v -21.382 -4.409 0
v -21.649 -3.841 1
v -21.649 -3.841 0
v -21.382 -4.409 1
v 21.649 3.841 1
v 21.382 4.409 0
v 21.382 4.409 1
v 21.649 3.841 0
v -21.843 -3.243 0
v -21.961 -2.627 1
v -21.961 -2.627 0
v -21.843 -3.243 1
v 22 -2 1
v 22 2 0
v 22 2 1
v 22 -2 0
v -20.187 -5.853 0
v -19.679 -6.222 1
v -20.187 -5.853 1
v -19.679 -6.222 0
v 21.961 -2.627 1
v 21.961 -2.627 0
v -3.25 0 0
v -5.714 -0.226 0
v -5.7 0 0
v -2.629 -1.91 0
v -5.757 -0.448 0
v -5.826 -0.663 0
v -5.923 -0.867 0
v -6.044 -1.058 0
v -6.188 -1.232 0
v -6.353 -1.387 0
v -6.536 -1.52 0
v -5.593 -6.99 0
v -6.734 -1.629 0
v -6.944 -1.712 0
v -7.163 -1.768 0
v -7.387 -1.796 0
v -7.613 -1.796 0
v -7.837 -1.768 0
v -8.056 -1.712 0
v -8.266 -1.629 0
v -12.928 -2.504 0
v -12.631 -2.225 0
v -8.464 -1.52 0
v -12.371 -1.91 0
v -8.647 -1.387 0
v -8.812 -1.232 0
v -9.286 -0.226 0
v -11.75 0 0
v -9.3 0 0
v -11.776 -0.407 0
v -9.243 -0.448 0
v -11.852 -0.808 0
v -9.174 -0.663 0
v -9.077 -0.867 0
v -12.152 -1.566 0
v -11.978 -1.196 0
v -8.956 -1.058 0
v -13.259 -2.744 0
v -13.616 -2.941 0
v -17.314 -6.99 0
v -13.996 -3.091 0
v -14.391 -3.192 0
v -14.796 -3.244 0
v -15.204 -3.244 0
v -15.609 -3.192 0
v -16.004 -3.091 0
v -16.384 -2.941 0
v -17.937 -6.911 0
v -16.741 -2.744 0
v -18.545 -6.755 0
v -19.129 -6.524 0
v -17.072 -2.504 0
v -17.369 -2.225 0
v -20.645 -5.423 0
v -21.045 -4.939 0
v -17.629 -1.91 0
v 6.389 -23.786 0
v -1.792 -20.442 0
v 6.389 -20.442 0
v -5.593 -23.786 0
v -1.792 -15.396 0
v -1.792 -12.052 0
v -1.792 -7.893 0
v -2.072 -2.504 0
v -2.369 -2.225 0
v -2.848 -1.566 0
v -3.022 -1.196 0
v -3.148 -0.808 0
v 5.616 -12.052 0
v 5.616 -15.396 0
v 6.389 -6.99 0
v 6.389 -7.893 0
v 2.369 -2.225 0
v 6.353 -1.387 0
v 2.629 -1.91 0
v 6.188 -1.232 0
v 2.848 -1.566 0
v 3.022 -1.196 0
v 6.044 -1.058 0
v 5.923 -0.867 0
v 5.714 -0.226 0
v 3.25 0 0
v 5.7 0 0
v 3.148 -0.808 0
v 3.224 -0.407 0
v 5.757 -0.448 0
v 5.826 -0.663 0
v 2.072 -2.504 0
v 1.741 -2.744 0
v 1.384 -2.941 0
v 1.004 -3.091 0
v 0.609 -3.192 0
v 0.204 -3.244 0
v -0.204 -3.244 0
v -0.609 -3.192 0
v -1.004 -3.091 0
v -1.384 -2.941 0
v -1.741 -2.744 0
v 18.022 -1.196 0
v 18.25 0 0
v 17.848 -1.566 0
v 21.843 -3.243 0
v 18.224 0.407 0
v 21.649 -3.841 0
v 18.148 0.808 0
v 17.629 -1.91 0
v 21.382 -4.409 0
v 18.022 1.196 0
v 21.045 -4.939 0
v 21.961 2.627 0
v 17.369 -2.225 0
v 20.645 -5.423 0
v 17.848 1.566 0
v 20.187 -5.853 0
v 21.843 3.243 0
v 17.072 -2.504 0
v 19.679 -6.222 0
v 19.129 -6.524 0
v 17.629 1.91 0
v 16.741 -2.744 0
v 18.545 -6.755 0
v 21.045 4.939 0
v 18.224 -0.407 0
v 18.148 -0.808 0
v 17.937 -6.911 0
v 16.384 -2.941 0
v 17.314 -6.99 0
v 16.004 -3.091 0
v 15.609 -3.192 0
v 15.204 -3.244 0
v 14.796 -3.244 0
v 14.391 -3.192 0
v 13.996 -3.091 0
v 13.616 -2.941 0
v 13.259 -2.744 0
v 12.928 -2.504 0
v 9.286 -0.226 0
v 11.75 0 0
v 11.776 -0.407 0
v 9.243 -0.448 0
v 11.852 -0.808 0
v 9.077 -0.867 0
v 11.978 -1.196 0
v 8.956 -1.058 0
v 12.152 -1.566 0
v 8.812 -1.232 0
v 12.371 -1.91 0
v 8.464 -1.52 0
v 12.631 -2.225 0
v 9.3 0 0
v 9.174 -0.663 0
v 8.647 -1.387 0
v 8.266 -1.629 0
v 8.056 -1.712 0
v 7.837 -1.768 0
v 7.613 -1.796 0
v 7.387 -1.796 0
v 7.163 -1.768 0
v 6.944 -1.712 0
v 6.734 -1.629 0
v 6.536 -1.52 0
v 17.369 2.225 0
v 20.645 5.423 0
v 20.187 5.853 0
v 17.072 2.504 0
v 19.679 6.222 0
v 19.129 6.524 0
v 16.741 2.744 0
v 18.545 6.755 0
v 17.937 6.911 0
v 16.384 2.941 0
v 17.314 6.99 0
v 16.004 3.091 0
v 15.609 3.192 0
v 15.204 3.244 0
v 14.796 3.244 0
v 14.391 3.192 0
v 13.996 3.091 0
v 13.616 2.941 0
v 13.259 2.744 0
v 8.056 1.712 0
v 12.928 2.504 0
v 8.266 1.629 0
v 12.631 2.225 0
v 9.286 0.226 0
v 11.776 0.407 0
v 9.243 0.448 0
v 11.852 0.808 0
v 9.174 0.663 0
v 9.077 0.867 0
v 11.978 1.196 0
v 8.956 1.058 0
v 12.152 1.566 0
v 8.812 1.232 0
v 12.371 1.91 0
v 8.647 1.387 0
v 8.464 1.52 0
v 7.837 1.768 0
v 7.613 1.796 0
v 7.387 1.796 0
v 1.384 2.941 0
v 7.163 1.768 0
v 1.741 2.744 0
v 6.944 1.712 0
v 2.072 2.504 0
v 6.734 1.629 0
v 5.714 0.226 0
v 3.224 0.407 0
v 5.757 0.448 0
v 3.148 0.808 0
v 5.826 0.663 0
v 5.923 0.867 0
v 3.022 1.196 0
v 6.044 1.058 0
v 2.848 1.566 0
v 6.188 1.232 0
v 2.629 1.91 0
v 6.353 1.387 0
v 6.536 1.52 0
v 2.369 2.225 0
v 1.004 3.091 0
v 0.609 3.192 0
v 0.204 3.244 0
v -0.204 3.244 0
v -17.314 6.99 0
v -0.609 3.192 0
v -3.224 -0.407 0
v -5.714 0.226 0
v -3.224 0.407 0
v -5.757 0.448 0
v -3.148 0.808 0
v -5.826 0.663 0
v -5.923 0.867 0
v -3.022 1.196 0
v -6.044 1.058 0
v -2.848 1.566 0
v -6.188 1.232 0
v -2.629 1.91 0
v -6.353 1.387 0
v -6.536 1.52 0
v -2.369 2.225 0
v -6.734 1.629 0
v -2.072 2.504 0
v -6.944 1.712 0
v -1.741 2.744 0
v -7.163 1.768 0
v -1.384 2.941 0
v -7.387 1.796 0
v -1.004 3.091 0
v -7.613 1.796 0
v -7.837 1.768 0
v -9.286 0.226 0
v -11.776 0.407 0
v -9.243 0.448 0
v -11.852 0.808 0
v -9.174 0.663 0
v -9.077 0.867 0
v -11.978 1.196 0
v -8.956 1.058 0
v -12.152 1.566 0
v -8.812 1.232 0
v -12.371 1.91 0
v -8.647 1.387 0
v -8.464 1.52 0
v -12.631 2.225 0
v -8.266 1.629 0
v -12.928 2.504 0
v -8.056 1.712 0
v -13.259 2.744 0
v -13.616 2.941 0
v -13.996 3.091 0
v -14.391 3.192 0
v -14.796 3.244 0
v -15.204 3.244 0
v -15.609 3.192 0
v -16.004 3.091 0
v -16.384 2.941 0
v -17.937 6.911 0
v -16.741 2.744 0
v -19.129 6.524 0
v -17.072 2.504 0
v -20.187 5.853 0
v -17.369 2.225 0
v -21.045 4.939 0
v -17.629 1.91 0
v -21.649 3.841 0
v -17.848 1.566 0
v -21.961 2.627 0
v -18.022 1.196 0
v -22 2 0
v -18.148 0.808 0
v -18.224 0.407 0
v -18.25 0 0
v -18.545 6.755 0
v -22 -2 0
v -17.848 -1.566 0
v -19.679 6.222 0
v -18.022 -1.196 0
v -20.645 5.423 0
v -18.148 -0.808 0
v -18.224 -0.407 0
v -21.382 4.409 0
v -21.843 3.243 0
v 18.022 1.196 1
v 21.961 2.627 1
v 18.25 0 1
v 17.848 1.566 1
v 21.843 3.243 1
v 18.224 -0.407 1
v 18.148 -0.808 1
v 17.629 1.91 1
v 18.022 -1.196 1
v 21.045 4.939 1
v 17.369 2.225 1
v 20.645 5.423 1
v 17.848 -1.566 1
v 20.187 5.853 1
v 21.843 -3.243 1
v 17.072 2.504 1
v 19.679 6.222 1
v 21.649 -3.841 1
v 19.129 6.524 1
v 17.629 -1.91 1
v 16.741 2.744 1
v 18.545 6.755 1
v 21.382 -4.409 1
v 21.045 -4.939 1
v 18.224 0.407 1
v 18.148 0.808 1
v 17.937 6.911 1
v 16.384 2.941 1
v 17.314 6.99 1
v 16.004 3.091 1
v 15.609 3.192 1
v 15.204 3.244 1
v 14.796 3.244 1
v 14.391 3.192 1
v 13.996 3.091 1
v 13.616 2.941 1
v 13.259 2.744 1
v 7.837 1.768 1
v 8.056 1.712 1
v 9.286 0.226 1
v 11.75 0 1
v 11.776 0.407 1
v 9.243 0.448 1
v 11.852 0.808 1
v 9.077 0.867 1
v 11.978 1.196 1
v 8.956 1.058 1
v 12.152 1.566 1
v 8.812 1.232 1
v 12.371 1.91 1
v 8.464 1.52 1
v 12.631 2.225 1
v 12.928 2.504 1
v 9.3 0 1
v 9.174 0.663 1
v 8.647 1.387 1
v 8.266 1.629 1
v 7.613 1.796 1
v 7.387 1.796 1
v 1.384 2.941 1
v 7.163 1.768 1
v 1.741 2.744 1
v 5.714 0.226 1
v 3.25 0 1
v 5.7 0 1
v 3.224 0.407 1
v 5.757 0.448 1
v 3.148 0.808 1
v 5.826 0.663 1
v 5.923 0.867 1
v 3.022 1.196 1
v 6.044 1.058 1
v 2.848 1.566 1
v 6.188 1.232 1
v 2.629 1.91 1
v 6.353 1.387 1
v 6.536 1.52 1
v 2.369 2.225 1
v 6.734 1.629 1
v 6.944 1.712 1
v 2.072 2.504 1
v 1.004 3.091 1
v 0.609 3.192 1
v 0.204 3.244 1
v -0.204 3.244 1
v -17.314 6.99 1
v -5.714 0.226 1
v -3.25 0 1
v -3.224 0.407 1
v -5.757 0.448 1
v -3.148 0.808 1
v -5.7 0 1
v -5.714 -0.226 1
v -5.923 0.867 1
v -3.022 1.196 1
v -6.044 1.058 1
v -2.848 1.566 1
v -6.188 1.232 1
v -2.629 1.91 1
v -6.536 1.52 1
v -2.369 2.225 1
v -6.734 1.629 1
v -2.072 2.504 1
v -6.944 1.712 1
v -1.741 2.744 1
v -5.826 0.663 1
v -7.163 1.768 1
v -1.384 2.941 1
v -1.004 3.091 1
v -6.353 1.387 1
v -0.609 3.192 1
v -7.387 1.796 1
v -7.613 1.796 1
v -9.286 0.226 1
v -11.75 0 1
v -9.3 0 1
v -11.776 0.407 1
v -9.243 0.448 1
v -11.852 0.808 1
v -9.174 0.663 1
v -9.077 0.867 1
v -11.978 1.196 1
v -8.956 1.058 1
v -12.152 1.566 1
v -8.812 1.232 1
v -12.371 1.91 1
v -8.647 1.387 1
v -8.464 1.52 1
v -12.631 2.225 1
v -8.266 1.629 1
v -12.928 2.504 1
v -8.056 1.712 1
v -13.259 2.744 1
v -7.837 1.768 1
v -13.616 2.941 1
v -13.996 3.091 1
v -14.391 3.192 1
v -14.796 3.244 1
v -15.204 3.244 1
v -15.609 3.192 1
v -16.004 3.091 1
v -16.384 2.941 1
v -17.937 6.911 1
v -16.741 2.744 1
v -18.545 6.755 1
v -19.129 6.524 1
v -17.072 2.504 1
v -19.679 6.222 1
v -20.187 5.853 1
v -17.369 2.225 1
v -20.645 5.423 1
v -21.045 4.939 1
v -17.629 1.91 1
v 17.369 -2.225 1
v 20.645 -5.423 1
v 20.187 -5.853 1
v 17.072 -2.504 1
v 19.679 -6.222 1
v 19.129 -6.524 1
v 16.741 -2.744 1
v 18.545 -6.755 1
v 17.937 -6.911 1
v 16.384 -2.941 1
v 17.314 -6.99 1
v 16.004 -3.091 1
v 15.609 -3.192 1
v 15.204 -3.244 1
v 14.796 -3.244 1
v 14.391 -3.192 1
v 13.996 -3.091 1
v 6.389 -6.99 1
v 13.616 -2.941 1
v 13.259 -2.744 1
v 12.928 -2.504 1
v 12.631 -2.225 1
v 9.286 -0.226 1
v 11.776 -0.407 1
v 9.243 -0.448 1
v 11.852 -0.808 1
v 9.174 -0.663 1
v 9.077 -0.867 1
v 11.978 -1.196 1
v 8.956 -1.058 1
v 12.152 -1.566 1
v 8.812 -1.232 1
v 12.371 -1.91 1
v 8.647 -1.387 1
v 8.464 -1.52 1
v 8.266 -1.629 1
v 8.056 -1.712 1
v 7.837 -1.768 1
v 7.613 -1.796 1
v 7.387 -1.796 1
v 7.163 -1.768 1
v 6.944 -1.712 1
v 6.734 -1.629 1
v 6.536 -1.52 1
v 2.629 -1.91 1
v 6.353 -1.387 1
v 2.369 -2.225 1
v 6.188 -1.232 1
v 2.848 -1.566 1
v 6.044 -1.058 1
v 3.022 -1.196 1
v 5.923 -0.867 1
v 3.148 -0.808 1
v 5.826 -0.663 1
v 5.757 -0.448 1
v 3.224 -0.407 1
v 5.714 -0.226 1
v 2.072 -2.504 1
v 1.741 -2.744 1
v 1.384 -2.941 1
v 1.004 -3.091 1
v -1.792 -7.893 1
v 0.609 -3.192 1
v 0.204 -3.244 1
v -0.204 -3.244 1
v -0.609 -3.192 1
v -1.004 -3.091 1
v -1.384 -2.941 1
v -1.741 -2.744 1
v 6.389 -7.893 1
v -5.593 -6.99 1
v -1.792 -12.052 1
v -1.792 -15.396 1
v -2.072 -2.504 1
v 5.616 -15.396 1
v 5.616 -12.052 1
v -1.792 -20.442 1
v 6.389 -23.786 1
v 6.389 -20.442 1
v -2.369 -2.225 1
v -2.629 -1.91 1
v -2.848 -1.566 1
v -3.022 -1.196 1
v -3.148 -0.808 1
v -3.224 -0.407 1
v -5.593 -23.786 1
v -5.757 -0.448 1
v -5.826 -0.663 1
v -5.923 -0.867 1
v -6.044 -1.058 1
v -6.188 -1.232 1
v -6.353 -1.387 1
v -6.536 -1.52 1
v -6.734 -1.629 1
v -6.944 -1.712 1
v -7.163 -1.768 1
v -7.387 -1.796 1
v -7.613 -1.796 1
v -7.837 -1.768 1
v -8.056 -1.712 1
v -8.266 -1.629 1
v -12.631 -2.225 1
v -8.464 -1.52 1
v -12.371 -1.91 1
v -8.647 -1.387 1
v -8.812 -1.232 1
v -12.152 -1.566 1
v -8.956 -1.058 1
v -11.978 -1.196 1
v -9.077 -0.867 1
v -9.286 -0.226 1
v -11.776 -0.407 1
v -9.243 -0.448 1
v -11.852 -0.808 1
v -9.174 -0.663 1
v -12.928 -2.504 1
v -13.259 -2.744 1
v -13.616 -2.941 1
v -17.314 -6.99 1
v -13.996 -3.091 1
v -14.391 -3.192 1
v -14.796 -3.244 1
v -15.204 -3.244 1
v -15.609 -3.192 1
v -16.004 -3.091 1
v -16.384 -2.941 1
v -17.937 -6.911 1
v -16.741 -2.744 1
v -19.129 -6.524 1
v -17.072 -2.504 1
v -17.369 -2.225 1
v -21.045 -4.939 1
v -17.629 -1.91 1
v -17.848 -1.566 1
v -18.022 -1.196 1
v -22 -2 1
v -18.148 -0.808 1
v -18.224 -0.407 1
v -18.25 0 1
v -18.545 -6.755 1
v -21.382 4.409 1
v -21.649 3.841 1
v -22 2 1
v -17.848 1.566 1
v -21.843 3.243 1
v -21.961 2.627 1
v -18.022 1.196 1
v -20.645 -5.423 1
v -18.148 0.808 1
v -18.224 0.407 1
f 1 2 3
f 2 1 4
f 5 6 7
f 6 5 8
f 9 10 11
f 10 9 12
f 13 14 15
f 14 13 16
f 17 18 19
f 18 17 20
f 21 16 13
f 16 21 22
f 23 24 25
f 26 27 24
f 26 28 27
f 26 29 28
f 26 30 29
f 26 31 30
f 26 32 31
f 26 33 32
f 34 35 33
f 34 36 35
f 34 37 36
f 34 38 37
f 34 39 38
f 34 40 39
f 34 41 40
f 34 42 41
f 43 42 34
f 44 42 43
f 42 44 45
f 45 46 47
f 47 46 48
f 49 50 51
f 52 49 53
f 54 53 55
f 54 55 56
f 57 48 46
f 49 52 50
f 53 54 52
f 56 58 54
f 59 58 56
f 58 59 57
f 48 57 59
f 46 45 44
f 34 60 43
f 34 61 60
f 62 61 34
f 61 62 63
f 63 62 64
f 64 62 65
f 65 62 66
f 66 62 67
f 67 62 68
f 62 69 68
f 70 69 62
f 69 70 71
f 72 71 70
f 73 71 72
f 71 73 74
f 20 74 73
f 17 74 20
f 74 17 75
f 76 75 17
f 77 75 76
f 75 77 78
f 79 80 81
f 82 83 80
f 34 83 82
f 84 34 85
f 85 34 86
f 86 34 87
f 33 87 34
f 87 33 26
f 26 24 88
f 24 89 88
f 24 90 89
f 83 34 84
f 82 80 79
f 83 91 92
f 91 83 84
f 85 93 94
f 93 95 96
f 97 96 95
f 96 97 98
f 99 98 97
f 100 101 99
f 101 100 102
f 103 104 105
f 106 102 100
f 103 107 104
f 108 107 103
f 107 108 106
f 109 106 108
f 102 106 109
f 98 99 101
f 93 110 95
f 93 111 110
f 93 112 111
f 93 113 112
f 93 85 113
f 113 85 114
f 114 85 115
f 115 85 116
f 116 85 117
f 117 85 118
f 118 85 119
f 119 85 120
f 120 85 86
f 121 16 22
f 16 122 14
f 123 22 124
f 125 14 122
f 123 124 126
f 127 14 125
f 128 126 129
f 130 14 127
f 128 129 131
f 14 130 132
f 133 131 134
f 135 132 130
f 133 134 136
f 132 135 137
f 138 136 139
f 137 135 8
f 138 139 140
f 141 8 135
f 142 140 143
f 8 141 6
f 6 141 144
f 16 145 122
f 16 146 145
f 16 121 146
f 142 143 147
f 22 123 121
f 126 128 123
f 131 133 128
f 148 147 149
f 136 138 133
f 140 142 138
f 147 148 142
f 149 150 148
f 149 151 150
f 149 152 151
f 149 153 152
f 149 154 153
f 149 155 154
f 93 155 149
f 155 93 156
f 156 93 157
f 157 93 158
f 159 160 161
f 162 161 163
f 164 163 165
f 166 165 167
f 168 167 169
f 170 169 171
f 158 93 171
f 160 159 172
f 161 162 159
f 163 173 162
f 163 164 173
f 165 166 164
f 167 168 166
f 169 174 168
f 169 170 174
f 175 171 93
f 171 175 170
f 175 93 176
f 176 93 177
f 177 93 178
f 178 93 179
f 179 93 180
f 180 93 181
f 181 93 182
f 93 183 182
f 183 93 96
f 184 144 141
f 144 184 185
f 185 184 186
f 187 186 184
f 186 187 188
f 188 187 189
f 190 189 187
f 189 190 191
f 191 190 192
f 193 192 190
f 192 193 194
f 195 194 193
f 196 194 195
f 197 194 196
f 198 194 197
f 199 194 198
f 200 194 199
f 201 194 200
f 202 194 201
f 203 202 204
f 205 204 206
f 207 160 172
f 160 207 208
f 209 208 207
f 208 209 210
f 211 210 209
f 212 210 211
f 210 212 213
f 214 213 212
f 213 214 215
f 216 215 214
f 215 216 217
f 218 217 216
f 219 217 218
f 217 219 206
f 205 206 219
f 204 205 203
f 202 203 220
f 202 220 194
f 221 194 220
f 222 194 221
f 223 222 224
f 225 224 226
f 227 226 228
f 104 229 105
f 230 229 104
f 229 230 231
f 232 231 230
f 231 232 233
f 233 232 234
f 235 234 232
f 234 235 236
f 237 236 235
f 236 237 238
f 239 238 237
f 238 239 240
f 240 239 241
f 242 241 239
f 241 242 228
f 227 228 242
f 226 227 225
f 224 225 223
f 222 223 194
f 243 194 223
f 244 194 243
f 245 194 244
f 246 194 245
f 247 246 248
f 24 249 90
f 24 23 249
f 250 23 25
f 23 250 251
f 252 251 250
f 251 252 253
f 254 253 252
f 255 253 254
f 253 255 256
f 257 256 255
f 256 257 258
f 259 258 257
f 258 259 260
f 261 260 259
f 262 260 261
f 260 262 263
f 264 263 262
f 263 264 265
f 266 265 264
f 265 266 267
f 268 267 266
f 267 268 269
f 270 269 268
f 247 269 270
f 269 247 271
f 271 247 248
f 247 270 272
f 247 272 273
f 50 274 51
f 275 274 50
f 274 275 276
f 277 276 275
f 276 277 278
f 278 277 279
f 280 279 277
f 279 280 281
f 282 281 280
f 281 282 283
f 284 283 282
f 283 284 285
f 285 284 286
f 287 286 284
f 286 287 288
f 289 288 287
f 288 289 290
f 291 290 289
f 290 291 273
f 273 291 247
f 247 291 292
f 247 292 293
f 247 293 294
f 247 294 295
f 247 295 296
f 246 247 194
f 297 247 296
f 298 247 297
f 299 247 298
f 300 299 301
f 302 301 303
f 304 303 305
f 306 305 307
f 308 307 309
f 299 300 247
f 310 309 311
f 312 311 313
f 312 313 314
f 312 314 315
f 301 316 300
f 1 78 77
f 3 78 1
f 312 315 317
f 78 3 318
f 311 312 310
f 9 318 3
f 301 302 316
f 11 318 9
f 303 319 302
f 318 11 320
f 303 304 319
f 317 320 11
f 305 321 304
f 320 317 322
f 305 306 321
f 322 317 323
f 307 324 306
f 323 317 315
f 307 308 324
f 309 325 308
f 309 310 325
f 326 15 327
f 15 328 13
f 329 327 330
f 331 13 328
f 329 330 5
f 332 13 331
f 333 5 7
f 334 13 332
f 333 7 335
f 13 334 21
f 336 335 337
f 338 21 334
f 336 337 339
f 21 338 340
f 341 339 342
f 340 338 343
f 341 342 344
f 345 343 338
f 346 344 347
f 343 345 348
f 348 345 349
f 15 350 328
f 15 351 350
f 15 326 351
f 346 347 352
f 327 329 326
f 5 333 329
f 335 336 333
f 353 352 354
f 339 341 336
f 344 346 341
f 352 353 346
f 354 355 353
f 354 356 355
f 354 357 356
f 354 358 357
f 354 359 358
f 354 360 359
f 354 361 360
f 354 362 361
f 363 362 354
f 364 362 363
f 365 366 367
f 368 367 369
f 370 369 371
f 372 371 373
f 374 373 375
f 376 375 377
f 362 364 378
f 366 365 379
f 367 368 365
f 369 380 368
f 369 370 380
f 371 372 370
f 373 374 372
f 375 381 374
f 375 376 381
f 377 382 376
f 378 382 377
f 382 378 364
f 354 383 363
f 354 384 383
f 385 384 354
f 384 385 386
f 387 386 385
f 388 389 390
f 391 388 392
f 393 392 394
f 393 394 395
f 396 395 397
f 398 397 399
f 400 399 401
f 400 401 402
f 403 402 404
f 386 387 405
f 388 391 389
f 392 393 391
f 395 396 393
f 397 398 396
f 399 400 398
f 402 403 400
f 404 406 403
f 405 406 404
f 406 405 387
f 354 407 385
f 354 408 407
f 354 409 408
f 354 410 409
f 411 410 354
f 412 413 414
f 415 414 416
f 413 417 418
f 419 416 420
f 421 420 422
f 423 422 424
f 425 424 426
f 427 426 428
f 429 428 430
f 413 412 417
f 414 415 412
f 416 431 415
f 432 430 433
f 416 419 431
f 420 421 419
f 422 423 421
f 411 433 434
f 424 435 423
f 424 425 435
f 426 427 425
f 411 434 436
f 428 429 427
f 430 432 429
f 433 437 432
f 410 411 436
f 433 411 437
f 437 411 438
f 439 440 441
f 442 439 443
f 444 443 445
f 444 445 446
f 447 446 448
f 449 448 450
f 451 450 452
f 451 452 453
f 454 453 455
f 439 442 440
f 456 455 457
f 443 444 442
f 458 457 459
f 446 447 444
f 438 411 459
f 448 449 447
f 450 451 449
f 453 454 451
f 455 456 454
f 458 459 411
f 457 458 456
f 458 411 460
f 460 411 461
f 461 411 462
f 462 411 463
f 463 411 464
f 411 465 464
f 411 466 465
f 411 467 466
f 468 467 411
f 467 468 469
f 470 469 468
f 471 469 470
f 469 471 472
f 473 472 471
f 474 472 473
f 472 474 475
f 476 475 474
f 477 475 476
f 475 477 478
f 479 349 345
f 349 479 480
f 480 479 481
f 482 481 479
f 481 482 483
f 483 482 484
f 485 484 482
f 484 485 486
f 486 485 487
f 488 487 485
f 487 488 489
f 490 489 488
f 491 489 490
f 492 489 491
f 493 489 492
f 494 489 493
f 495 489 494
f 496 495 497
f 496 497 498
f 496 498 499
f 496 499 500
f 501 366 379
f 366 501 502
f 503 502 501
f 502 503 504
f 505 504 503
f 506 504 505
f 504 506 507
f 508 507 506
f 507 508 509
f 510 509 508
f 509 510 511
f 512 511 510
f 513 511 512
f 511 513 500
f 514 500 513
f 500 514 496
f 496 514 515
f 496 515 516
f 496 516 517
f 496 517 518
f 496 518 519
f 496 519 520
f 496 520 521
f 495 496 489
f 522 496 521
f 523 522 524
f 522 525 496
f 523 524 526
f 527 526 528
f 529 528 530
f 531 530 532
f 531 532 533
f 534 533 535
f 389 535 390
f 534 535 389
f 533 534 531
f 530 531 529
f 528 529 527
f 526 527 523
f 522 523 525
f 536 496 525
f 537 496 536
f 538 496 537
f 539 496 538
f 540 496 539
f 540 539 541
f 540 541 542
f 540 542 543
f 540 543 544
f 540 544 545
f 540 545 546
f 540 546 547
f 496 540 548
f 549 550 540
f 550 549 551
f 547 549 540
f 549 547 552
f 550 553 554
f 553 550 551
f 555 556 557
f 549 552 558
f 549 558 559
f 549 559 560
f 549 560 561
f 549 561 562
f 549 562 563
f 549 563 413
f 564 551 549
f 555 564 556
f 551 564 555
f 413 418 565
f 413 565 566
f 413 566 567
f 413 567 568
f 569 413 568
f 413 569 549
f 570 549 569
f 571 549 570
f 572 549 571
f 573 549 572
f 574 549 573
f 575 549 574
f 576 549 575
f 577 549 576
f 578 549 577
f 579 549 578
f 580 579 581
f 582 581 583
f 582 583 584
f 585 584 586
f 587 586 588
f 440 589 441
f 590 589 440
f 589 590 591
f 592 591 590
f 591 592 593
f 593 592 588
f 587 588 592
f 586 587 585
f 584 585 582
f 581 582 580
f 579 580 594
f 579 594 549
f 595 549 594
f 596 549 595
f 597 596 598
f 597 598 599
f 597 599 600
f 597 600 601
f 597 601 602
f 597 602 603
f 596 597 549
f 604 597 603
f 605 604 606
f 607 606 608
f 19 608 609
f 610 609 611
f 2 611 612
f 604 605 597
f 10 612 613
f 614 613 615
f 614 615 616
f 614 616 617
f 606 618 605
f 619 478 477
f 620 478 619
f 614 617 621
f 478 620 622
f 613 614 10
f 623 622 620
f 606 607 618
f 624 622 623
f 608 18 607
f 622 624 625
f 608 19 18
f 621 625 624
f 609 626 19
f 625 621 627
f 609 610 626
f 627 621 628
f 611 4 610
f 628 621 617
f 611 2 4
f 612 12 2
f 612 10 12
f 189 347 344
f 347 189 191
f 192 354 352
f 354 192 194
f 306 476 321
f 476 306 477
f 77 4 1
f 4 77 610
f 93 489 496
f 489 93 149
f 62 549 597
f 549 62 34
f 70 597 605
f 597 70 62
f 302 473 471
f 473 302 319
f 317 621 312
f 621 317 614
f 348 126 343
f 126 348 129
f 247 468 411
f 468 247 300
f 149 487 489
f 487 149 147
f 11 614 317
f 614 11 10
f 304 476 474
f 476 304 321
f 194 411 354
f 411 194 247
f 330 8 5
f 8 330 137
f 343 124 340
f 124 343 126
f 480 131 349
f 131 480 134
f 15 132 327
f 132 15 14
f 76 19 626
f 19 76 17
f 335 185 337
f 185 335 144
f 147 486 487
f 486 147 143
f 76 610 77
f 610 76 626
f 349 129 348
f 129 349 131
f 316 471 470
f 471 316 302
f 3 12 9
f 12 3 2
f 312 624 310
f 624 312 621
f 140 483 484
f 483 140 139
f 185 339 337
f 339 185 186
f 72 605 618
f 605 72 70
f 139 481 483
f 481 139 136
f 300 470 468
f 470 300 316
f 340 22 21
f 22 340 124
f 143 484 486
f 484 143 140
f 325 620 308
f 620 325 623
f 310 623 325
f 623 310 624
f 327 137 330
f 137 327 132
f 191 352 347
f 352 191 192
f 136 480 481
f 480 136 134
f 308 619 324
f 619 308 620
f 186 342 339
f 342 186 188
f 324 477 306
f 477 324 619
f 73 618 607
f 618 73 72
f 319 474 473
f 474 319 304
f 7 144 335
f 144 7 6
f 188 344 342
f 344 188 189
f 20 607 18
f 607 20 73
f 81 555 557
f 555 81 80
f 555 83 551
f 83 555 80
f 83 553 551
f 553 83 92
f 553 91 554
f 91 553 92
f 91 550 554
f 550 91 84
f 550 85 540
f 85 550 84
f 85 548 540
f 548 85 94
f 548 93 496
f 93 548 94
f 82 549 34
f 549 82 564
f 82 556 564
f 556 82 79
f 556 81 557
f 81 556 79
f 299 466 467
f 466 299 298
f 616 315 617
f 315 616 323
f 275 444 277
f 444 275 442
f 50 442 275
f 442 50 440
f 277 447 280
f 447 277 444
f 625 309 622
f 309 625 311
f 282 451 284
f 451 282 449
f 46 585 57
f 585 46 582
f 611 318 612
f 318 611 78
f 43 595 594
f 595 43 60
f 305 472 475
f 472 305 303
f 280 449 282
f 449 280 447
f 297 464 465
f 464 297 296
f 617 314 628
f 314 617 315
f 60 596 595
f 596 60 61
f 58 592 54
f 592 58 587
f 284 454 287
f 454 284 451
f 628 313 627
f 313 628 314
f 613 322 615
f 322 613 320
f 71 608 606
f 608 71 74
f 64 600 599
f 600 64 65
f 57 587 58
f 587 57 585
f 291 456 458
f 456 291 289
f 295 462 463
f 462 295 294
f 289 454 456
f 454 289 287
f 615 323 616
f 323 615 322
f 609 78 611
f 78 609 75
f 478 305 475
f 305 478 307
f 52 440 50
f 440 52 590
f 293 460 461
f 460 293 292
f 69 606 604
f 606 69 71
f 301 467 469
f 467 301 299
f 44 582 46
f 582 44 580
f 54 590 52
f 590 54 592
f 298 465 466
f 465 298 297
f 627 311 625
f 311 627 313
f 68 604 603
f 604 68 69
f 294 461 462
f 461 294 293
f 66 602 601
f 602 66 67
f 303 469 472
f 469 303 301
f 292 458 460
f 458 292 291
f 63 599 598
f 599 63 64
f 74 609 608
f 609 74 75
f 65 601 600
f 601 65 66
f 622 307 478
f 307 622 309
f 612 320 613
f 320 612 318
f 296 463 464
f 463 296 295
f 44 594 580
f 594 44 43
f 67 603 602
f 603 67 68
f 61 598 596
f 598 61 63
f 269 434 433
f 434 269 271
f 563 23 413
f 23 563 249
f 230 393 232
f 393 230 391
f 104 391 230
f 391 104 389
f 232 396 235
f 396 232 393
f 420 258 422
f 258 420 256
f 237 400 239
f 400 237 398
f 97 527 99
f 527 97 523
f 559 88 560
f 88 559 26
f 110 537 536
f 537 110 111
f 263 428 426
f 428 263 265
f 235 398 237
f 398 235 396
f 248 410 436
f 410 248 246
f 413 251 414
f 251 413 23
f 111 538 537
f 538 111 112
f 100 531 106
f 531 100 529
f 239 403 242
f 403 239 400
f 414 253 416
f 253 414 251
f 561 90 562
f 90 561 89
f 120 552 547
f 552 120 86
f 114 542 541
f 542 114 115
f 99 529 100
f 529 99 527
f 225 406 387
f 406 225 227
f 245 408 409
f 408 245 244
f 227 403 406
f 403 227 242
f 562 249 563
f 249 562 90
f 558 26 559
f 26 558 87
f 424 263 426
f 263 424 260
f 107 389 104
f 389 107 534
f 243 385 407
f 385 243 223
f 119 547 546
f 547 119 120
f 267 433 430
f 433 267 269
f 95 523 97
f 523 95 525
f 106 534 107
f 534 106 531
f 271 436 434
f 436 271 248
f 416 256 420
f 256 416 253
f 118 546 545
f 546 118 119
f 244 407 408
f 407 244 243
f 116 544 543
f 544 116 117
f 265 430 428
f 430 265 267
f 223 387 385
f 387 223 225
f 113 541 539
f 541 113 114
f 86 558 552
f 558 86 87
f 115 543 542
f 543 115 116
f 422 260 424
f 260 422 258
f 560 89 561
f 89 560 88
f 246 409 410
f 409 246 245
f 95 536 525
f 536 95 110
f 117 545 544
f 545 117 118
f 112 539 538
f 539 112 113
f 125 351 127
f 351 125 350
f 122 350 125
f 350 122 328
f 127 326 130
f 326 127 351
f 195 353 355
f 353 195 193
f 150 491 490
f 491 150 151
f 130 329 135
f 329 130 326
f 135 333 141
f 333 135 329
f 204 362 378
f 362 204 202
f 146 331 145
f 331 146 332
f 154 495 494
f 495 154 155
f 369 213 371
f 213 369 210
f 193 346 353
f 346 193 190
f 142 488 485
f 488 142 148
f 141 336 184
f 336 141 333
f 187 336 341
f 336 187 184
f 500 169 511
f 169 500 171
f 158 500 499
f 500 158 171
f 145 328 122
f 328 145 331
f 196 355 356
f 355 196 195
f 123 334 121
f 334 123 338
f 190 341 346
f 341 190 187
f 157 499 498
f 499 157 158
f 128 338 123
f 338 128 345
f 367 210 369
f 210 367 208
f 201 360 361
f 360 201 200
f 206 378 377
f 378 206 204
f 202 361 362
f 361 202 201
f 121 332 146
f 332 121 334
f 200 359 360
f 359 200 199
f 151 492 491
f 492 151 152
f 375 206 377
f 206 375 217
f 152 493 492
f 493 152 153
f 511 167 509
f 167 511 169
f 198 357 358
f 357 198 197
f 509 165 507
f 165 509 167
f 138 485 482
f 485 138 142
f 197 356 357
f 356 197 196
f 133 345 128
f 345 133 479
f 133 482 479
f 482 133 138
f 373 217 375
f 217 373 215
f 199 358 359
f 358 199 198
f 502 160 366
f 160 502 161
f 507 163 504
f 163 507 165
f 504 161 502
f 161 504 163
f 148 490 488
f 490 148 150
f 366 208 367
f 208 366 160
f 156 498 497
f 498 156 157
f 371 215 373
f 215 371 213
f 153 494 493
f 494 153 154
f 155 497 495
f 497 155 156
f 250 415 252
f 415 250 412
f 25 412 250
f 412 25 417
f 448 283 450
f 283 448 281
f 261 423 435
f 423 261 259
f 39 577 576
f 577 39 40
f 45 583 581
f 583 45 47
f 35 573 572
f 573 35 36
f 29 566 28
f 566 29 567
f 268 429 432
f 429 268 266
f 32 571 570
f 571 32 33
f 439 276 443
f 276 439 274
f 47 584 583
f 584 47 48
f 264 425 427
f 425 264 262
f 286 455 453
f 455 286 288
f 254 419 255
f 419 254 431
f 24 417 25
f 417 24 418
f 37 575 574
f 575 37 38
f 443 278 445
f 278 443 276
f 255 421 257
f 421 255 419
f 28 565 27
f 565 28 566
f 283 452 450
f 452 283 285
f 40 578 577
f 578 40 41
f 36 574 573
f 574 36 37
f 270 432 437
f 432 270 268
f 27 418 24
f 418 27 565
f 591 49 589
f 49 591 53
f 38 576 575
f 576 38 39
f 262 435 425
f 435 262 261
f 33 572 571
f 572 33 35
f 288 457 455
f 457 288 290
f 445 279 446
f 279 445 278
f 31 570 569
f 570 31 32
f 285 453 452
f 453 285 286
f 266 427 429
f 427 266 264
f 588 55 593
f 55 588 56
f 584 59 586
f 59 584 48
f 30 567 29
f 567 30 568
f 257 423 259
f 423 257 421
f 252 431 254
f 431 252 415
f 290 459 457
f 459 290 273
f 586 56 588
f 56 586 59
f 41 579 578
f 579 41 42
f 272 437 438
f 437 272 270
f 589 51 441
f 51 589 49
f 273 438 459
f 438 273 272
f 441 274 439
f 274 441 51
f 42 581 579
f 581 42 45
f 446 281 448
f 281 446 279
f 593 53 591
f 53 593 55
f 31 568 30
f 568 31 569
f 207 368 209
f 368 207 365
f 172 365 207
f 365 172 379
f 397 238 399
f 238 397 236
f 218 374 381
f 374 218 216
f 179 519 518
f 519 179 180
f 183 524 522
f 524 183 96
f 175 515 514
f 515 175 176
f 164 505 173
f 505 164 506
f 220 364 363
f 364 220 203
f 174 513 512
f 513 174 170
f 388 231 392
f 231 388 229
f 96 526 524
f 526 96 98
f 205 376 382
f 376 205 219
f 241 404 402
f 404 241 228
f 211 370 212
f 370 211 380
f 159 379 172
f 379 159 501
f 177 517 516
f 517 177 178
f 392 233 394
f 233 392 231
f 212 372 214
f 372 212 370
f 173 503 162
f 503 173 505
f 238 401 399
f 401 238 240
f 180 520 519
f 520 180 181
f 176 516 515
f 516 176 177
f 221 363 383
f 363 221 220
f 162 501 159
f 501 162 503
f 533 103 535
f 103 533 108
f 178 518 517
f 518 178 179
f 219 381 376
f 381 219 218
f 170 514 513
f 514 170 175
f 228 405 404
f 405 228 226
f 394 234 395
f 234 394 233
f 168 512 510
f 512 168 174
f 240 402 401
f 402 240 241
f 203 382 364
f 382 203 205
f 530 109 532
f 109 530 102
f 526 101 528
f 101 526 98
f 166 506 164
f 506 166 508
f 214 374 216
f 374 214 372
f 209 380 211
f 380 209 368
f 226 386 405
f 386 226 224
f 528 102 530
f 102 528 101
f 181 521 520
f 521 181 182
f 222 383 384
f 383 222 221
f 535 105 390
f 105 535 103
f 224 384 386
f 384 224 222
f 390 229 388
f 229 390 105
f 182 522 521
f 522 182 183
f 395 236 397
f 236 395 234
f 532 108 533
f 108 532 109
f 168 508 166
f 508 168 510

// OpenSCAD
$fn = 50;


difference() {
	union() {
		*color(alpha = 1.0000000000, c = "gray") {
			translate(v = [0, 14, 0]) {
				linear_extrude(height = 1) {
					text(font = "Arial:style=Bold", halign = "center", size = 4.5000000000, text = "COMMENT description oobb_plate_shape_p_type_1_depth_3_width_1_thickness_e_extra_oobb_size", valign = "center");
				}
			}
		}
		hull() {
			translate(v = [-17.0000000000, 2.0000000000, 0]) {
				cylinder(h = 1, r = 5);
			}
			translate(v = [17.0000000000, 2.0000000000, 0]) {
				cylinder(h = 1, r = 5);
			}
			translate(v = [-17.0000000000, -2.0000000000, 0]) {
				cylinder(h = 1, r = 5);
			}
			translate(v = [17.0000000000, -2.0000000000, 0]) {
				cylinder(h = 1, r = 5);
			}
		}
		translate(v = [0, -5, 0]) {
			linear_extrude(height = 1) {
				text(font = "DejaVu Sans Mono:style=Bold", halign = "center", size = 19.0000000000, text = "E", valign = "top");
			}
		}
	}
	union() {
		*color(alpha = 1.0000000000, c = "gray") {
			translate(v = [0, 14, 0]) {
				linear_extrude(height = 1) {
					text(font = "Arial:style=Bold", halign = "center", size = 4.5000000000, text = "COMMENT description oobb_holes_shape_n_type_3_width_1_thickness_e_extra_oobb_size_1_height_'all'_holes_true_both_holes", valign = "center");
				}
			}
		}
		translate(v = [-15.0000000000, 0.0000000000, 0]) {
			translate(v = [0, 0, -50]) {
				cylinder(h = 100, r = 3.2500000000);
			}
		}
		translate(v = [0, 0, -50]) {
			cylinder(h = 100, r = 3.2500000000);
		}
		translate(v = [15.0000000000, 0.0000000000, 0]) {
			translate(v = [0, 0, -50]) {
				cylinder(h = 100, r = 3.2500000000);
			}
		}
		translate(v = [-15.0000000000, 0.0000000000, 0]) {
			translate(v = [0, 0, -50]) {
				cylinder(h = 100, r = 1.8000000000);
			}
		}
		translate(v = [-7.5000000000, 0.0000000000, 0]) {
			translate(v = [0, 0, -50]) {
				cylinder(h = 100, r = 1.8000000000);
			}
		}
		translate(v = [0, 0, -50]) {
			cylinder(h = 100, r = 1.8000000000);
		}
		translate(v = [7.5000000000, 0.0000000000, 0]) {
			translate(v = [0, 0, -50]) {
				cylinder(h = 100, r = 1.8000000000);
			}
		}
		translate(v = [15.0000000000, 0.0000000000, 0]) {
			translate(v = [0, 0, -50]) {
				cylinder(h = 100, r = 1.8000000000);
			}
		}
	}
}
